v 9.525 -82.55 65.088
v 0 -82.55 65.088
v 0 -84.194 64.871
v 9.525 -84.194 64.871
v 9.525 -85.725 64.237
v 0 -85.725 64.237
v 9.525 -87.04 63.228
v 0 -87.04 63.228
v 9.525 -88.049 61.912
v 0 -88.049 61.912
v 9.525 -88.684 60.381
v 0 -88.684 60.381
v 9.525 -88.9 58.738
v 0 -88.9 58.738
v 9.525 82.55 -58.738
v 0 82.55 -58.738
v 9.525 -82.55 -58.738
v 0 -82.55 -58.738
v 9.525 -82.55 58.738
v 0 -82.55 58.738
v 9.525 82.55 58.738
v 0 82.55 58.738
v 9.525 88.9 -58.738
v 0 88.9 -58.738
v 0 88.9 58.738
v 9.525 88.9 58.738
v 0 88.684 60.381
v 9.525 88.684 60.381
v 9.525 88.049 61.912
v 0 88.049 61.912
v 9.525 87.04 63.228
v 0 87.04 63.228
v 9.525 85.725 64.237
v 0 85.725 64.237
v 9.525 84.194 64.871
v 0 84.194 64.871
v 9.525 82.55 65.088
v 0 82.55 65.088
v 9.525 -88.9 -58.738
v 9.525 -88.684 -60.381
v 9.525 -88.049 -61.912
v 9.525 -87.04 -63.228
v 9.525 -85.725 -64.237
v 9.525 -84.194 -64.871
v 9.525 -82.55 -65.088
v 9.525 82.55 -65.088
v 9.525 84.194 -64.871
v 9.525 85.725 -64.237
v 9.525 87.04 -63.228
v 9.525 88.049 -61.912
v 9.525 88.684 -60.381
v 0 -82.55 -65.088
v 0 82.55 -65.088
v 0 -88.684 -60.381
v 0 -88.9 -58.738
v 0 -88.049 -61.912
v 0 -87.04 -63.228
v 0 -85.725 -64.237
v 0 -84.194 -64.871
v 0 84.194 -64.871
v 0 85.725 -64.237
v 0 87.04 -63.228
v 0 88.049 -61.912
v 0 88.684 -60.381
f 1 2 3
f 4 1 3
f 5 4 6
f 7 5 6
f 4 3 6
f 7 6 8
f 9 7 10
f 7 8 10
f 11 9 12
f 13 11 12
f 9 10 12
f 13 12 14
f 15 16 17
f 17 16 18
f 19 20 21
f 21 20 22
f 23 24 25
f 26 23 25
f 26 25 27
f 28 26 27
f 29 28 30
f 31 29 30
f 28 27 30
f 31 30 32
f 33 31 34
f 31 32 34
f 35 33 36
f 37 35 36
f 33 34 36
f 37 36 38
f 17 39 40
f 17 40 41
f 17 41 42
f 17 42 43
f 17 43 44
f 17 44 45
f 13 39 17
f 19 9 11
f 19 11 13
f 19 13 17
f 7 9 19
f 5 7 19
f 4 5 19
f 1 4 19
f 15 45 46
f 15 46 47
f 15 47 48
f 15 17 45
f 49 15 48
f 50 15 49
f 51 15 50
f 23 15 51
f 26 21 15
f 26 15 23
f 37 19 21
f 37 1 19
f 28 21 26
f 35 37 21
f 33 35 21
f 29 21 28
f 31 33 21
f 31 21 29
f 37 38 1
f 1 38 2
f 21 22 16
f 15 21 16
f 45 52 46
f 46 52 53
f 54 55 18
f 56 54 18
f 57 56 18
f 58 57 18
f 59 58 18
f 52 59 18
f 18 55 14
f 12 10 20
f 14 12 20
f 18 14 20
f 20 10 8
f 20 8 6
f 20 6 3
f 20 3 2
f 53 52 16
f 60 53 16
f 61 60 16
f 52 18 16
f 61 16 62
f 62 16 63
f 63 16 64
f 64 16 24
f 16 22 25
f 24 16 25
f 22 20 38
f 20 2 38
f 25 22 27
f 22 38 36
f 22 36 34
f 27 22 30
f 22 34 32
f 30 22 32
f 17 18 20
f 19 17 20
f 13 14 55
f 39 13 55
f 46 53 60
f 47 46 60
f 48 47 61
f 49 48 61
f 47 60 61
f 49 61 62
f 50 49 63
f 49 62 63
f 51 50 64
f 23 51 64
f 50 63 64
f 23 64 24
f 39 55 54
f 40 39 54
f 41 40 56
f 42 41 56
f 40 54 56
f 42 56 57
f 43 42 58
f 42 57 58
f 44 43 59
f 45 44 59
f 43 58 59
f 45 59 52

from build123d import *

# Parameters (mm, degrees)
F1_DEPTH = 9.525


# Not quite as in the source:
# - a length typed as a fraction of an inch, garbled in the dataset ("3 / 203.2 mm" for 3/8 in), is restored


with BuildPart() as f1:
    # F0 (on Right) → F1 (new body)
    with BuildSketch(Plane.YZ):
        with BuildLine():
            ThreePointArc((88.9, 58.7375), (87.0401280605, 63.2276280605), (82.55, 65.0875))
            Line((82.55, 65.0875), (-82.55, 65.0875))
            ThreePointArc((-82.55, 65.0875), (-87.0401280605, 63.2276280605), (-88.9, 58.7375))
            Line((-88.9, 58.7375), (-88.9, -58.7375))
            ThreePointArc((-88.9, -58.7375), (-87.0401280605, -63.2276280605), (-82.55, -65.0875))
            Line((-82.55, -65.0875), (82.55, -65.0875))
            ThreePointArc((82.55, -65.0875), (87.0401280605, -63.2276280605), (88.9, -58.7375))
            Line((88.9, -58.7375), (88.9, 58.7375))
        make_face()
        Polygon((82.55, 58.7375), (82.55, 53.975), (82.55, -53.975), (82.55, -58.7375), (74.6125, -58.7375), (-74.6125, -58.7375), (-82.55, -58.7375), (-82.55, -53.975), (-82.55, 53.975), (-82.55, 58.7375), (-74.6125, 58.7375), (74.6125, 58.7375), align=None, mode=Mode.SUBTRACT)
    extrude(amount=F1_DEPTH)


solid = f1.part
